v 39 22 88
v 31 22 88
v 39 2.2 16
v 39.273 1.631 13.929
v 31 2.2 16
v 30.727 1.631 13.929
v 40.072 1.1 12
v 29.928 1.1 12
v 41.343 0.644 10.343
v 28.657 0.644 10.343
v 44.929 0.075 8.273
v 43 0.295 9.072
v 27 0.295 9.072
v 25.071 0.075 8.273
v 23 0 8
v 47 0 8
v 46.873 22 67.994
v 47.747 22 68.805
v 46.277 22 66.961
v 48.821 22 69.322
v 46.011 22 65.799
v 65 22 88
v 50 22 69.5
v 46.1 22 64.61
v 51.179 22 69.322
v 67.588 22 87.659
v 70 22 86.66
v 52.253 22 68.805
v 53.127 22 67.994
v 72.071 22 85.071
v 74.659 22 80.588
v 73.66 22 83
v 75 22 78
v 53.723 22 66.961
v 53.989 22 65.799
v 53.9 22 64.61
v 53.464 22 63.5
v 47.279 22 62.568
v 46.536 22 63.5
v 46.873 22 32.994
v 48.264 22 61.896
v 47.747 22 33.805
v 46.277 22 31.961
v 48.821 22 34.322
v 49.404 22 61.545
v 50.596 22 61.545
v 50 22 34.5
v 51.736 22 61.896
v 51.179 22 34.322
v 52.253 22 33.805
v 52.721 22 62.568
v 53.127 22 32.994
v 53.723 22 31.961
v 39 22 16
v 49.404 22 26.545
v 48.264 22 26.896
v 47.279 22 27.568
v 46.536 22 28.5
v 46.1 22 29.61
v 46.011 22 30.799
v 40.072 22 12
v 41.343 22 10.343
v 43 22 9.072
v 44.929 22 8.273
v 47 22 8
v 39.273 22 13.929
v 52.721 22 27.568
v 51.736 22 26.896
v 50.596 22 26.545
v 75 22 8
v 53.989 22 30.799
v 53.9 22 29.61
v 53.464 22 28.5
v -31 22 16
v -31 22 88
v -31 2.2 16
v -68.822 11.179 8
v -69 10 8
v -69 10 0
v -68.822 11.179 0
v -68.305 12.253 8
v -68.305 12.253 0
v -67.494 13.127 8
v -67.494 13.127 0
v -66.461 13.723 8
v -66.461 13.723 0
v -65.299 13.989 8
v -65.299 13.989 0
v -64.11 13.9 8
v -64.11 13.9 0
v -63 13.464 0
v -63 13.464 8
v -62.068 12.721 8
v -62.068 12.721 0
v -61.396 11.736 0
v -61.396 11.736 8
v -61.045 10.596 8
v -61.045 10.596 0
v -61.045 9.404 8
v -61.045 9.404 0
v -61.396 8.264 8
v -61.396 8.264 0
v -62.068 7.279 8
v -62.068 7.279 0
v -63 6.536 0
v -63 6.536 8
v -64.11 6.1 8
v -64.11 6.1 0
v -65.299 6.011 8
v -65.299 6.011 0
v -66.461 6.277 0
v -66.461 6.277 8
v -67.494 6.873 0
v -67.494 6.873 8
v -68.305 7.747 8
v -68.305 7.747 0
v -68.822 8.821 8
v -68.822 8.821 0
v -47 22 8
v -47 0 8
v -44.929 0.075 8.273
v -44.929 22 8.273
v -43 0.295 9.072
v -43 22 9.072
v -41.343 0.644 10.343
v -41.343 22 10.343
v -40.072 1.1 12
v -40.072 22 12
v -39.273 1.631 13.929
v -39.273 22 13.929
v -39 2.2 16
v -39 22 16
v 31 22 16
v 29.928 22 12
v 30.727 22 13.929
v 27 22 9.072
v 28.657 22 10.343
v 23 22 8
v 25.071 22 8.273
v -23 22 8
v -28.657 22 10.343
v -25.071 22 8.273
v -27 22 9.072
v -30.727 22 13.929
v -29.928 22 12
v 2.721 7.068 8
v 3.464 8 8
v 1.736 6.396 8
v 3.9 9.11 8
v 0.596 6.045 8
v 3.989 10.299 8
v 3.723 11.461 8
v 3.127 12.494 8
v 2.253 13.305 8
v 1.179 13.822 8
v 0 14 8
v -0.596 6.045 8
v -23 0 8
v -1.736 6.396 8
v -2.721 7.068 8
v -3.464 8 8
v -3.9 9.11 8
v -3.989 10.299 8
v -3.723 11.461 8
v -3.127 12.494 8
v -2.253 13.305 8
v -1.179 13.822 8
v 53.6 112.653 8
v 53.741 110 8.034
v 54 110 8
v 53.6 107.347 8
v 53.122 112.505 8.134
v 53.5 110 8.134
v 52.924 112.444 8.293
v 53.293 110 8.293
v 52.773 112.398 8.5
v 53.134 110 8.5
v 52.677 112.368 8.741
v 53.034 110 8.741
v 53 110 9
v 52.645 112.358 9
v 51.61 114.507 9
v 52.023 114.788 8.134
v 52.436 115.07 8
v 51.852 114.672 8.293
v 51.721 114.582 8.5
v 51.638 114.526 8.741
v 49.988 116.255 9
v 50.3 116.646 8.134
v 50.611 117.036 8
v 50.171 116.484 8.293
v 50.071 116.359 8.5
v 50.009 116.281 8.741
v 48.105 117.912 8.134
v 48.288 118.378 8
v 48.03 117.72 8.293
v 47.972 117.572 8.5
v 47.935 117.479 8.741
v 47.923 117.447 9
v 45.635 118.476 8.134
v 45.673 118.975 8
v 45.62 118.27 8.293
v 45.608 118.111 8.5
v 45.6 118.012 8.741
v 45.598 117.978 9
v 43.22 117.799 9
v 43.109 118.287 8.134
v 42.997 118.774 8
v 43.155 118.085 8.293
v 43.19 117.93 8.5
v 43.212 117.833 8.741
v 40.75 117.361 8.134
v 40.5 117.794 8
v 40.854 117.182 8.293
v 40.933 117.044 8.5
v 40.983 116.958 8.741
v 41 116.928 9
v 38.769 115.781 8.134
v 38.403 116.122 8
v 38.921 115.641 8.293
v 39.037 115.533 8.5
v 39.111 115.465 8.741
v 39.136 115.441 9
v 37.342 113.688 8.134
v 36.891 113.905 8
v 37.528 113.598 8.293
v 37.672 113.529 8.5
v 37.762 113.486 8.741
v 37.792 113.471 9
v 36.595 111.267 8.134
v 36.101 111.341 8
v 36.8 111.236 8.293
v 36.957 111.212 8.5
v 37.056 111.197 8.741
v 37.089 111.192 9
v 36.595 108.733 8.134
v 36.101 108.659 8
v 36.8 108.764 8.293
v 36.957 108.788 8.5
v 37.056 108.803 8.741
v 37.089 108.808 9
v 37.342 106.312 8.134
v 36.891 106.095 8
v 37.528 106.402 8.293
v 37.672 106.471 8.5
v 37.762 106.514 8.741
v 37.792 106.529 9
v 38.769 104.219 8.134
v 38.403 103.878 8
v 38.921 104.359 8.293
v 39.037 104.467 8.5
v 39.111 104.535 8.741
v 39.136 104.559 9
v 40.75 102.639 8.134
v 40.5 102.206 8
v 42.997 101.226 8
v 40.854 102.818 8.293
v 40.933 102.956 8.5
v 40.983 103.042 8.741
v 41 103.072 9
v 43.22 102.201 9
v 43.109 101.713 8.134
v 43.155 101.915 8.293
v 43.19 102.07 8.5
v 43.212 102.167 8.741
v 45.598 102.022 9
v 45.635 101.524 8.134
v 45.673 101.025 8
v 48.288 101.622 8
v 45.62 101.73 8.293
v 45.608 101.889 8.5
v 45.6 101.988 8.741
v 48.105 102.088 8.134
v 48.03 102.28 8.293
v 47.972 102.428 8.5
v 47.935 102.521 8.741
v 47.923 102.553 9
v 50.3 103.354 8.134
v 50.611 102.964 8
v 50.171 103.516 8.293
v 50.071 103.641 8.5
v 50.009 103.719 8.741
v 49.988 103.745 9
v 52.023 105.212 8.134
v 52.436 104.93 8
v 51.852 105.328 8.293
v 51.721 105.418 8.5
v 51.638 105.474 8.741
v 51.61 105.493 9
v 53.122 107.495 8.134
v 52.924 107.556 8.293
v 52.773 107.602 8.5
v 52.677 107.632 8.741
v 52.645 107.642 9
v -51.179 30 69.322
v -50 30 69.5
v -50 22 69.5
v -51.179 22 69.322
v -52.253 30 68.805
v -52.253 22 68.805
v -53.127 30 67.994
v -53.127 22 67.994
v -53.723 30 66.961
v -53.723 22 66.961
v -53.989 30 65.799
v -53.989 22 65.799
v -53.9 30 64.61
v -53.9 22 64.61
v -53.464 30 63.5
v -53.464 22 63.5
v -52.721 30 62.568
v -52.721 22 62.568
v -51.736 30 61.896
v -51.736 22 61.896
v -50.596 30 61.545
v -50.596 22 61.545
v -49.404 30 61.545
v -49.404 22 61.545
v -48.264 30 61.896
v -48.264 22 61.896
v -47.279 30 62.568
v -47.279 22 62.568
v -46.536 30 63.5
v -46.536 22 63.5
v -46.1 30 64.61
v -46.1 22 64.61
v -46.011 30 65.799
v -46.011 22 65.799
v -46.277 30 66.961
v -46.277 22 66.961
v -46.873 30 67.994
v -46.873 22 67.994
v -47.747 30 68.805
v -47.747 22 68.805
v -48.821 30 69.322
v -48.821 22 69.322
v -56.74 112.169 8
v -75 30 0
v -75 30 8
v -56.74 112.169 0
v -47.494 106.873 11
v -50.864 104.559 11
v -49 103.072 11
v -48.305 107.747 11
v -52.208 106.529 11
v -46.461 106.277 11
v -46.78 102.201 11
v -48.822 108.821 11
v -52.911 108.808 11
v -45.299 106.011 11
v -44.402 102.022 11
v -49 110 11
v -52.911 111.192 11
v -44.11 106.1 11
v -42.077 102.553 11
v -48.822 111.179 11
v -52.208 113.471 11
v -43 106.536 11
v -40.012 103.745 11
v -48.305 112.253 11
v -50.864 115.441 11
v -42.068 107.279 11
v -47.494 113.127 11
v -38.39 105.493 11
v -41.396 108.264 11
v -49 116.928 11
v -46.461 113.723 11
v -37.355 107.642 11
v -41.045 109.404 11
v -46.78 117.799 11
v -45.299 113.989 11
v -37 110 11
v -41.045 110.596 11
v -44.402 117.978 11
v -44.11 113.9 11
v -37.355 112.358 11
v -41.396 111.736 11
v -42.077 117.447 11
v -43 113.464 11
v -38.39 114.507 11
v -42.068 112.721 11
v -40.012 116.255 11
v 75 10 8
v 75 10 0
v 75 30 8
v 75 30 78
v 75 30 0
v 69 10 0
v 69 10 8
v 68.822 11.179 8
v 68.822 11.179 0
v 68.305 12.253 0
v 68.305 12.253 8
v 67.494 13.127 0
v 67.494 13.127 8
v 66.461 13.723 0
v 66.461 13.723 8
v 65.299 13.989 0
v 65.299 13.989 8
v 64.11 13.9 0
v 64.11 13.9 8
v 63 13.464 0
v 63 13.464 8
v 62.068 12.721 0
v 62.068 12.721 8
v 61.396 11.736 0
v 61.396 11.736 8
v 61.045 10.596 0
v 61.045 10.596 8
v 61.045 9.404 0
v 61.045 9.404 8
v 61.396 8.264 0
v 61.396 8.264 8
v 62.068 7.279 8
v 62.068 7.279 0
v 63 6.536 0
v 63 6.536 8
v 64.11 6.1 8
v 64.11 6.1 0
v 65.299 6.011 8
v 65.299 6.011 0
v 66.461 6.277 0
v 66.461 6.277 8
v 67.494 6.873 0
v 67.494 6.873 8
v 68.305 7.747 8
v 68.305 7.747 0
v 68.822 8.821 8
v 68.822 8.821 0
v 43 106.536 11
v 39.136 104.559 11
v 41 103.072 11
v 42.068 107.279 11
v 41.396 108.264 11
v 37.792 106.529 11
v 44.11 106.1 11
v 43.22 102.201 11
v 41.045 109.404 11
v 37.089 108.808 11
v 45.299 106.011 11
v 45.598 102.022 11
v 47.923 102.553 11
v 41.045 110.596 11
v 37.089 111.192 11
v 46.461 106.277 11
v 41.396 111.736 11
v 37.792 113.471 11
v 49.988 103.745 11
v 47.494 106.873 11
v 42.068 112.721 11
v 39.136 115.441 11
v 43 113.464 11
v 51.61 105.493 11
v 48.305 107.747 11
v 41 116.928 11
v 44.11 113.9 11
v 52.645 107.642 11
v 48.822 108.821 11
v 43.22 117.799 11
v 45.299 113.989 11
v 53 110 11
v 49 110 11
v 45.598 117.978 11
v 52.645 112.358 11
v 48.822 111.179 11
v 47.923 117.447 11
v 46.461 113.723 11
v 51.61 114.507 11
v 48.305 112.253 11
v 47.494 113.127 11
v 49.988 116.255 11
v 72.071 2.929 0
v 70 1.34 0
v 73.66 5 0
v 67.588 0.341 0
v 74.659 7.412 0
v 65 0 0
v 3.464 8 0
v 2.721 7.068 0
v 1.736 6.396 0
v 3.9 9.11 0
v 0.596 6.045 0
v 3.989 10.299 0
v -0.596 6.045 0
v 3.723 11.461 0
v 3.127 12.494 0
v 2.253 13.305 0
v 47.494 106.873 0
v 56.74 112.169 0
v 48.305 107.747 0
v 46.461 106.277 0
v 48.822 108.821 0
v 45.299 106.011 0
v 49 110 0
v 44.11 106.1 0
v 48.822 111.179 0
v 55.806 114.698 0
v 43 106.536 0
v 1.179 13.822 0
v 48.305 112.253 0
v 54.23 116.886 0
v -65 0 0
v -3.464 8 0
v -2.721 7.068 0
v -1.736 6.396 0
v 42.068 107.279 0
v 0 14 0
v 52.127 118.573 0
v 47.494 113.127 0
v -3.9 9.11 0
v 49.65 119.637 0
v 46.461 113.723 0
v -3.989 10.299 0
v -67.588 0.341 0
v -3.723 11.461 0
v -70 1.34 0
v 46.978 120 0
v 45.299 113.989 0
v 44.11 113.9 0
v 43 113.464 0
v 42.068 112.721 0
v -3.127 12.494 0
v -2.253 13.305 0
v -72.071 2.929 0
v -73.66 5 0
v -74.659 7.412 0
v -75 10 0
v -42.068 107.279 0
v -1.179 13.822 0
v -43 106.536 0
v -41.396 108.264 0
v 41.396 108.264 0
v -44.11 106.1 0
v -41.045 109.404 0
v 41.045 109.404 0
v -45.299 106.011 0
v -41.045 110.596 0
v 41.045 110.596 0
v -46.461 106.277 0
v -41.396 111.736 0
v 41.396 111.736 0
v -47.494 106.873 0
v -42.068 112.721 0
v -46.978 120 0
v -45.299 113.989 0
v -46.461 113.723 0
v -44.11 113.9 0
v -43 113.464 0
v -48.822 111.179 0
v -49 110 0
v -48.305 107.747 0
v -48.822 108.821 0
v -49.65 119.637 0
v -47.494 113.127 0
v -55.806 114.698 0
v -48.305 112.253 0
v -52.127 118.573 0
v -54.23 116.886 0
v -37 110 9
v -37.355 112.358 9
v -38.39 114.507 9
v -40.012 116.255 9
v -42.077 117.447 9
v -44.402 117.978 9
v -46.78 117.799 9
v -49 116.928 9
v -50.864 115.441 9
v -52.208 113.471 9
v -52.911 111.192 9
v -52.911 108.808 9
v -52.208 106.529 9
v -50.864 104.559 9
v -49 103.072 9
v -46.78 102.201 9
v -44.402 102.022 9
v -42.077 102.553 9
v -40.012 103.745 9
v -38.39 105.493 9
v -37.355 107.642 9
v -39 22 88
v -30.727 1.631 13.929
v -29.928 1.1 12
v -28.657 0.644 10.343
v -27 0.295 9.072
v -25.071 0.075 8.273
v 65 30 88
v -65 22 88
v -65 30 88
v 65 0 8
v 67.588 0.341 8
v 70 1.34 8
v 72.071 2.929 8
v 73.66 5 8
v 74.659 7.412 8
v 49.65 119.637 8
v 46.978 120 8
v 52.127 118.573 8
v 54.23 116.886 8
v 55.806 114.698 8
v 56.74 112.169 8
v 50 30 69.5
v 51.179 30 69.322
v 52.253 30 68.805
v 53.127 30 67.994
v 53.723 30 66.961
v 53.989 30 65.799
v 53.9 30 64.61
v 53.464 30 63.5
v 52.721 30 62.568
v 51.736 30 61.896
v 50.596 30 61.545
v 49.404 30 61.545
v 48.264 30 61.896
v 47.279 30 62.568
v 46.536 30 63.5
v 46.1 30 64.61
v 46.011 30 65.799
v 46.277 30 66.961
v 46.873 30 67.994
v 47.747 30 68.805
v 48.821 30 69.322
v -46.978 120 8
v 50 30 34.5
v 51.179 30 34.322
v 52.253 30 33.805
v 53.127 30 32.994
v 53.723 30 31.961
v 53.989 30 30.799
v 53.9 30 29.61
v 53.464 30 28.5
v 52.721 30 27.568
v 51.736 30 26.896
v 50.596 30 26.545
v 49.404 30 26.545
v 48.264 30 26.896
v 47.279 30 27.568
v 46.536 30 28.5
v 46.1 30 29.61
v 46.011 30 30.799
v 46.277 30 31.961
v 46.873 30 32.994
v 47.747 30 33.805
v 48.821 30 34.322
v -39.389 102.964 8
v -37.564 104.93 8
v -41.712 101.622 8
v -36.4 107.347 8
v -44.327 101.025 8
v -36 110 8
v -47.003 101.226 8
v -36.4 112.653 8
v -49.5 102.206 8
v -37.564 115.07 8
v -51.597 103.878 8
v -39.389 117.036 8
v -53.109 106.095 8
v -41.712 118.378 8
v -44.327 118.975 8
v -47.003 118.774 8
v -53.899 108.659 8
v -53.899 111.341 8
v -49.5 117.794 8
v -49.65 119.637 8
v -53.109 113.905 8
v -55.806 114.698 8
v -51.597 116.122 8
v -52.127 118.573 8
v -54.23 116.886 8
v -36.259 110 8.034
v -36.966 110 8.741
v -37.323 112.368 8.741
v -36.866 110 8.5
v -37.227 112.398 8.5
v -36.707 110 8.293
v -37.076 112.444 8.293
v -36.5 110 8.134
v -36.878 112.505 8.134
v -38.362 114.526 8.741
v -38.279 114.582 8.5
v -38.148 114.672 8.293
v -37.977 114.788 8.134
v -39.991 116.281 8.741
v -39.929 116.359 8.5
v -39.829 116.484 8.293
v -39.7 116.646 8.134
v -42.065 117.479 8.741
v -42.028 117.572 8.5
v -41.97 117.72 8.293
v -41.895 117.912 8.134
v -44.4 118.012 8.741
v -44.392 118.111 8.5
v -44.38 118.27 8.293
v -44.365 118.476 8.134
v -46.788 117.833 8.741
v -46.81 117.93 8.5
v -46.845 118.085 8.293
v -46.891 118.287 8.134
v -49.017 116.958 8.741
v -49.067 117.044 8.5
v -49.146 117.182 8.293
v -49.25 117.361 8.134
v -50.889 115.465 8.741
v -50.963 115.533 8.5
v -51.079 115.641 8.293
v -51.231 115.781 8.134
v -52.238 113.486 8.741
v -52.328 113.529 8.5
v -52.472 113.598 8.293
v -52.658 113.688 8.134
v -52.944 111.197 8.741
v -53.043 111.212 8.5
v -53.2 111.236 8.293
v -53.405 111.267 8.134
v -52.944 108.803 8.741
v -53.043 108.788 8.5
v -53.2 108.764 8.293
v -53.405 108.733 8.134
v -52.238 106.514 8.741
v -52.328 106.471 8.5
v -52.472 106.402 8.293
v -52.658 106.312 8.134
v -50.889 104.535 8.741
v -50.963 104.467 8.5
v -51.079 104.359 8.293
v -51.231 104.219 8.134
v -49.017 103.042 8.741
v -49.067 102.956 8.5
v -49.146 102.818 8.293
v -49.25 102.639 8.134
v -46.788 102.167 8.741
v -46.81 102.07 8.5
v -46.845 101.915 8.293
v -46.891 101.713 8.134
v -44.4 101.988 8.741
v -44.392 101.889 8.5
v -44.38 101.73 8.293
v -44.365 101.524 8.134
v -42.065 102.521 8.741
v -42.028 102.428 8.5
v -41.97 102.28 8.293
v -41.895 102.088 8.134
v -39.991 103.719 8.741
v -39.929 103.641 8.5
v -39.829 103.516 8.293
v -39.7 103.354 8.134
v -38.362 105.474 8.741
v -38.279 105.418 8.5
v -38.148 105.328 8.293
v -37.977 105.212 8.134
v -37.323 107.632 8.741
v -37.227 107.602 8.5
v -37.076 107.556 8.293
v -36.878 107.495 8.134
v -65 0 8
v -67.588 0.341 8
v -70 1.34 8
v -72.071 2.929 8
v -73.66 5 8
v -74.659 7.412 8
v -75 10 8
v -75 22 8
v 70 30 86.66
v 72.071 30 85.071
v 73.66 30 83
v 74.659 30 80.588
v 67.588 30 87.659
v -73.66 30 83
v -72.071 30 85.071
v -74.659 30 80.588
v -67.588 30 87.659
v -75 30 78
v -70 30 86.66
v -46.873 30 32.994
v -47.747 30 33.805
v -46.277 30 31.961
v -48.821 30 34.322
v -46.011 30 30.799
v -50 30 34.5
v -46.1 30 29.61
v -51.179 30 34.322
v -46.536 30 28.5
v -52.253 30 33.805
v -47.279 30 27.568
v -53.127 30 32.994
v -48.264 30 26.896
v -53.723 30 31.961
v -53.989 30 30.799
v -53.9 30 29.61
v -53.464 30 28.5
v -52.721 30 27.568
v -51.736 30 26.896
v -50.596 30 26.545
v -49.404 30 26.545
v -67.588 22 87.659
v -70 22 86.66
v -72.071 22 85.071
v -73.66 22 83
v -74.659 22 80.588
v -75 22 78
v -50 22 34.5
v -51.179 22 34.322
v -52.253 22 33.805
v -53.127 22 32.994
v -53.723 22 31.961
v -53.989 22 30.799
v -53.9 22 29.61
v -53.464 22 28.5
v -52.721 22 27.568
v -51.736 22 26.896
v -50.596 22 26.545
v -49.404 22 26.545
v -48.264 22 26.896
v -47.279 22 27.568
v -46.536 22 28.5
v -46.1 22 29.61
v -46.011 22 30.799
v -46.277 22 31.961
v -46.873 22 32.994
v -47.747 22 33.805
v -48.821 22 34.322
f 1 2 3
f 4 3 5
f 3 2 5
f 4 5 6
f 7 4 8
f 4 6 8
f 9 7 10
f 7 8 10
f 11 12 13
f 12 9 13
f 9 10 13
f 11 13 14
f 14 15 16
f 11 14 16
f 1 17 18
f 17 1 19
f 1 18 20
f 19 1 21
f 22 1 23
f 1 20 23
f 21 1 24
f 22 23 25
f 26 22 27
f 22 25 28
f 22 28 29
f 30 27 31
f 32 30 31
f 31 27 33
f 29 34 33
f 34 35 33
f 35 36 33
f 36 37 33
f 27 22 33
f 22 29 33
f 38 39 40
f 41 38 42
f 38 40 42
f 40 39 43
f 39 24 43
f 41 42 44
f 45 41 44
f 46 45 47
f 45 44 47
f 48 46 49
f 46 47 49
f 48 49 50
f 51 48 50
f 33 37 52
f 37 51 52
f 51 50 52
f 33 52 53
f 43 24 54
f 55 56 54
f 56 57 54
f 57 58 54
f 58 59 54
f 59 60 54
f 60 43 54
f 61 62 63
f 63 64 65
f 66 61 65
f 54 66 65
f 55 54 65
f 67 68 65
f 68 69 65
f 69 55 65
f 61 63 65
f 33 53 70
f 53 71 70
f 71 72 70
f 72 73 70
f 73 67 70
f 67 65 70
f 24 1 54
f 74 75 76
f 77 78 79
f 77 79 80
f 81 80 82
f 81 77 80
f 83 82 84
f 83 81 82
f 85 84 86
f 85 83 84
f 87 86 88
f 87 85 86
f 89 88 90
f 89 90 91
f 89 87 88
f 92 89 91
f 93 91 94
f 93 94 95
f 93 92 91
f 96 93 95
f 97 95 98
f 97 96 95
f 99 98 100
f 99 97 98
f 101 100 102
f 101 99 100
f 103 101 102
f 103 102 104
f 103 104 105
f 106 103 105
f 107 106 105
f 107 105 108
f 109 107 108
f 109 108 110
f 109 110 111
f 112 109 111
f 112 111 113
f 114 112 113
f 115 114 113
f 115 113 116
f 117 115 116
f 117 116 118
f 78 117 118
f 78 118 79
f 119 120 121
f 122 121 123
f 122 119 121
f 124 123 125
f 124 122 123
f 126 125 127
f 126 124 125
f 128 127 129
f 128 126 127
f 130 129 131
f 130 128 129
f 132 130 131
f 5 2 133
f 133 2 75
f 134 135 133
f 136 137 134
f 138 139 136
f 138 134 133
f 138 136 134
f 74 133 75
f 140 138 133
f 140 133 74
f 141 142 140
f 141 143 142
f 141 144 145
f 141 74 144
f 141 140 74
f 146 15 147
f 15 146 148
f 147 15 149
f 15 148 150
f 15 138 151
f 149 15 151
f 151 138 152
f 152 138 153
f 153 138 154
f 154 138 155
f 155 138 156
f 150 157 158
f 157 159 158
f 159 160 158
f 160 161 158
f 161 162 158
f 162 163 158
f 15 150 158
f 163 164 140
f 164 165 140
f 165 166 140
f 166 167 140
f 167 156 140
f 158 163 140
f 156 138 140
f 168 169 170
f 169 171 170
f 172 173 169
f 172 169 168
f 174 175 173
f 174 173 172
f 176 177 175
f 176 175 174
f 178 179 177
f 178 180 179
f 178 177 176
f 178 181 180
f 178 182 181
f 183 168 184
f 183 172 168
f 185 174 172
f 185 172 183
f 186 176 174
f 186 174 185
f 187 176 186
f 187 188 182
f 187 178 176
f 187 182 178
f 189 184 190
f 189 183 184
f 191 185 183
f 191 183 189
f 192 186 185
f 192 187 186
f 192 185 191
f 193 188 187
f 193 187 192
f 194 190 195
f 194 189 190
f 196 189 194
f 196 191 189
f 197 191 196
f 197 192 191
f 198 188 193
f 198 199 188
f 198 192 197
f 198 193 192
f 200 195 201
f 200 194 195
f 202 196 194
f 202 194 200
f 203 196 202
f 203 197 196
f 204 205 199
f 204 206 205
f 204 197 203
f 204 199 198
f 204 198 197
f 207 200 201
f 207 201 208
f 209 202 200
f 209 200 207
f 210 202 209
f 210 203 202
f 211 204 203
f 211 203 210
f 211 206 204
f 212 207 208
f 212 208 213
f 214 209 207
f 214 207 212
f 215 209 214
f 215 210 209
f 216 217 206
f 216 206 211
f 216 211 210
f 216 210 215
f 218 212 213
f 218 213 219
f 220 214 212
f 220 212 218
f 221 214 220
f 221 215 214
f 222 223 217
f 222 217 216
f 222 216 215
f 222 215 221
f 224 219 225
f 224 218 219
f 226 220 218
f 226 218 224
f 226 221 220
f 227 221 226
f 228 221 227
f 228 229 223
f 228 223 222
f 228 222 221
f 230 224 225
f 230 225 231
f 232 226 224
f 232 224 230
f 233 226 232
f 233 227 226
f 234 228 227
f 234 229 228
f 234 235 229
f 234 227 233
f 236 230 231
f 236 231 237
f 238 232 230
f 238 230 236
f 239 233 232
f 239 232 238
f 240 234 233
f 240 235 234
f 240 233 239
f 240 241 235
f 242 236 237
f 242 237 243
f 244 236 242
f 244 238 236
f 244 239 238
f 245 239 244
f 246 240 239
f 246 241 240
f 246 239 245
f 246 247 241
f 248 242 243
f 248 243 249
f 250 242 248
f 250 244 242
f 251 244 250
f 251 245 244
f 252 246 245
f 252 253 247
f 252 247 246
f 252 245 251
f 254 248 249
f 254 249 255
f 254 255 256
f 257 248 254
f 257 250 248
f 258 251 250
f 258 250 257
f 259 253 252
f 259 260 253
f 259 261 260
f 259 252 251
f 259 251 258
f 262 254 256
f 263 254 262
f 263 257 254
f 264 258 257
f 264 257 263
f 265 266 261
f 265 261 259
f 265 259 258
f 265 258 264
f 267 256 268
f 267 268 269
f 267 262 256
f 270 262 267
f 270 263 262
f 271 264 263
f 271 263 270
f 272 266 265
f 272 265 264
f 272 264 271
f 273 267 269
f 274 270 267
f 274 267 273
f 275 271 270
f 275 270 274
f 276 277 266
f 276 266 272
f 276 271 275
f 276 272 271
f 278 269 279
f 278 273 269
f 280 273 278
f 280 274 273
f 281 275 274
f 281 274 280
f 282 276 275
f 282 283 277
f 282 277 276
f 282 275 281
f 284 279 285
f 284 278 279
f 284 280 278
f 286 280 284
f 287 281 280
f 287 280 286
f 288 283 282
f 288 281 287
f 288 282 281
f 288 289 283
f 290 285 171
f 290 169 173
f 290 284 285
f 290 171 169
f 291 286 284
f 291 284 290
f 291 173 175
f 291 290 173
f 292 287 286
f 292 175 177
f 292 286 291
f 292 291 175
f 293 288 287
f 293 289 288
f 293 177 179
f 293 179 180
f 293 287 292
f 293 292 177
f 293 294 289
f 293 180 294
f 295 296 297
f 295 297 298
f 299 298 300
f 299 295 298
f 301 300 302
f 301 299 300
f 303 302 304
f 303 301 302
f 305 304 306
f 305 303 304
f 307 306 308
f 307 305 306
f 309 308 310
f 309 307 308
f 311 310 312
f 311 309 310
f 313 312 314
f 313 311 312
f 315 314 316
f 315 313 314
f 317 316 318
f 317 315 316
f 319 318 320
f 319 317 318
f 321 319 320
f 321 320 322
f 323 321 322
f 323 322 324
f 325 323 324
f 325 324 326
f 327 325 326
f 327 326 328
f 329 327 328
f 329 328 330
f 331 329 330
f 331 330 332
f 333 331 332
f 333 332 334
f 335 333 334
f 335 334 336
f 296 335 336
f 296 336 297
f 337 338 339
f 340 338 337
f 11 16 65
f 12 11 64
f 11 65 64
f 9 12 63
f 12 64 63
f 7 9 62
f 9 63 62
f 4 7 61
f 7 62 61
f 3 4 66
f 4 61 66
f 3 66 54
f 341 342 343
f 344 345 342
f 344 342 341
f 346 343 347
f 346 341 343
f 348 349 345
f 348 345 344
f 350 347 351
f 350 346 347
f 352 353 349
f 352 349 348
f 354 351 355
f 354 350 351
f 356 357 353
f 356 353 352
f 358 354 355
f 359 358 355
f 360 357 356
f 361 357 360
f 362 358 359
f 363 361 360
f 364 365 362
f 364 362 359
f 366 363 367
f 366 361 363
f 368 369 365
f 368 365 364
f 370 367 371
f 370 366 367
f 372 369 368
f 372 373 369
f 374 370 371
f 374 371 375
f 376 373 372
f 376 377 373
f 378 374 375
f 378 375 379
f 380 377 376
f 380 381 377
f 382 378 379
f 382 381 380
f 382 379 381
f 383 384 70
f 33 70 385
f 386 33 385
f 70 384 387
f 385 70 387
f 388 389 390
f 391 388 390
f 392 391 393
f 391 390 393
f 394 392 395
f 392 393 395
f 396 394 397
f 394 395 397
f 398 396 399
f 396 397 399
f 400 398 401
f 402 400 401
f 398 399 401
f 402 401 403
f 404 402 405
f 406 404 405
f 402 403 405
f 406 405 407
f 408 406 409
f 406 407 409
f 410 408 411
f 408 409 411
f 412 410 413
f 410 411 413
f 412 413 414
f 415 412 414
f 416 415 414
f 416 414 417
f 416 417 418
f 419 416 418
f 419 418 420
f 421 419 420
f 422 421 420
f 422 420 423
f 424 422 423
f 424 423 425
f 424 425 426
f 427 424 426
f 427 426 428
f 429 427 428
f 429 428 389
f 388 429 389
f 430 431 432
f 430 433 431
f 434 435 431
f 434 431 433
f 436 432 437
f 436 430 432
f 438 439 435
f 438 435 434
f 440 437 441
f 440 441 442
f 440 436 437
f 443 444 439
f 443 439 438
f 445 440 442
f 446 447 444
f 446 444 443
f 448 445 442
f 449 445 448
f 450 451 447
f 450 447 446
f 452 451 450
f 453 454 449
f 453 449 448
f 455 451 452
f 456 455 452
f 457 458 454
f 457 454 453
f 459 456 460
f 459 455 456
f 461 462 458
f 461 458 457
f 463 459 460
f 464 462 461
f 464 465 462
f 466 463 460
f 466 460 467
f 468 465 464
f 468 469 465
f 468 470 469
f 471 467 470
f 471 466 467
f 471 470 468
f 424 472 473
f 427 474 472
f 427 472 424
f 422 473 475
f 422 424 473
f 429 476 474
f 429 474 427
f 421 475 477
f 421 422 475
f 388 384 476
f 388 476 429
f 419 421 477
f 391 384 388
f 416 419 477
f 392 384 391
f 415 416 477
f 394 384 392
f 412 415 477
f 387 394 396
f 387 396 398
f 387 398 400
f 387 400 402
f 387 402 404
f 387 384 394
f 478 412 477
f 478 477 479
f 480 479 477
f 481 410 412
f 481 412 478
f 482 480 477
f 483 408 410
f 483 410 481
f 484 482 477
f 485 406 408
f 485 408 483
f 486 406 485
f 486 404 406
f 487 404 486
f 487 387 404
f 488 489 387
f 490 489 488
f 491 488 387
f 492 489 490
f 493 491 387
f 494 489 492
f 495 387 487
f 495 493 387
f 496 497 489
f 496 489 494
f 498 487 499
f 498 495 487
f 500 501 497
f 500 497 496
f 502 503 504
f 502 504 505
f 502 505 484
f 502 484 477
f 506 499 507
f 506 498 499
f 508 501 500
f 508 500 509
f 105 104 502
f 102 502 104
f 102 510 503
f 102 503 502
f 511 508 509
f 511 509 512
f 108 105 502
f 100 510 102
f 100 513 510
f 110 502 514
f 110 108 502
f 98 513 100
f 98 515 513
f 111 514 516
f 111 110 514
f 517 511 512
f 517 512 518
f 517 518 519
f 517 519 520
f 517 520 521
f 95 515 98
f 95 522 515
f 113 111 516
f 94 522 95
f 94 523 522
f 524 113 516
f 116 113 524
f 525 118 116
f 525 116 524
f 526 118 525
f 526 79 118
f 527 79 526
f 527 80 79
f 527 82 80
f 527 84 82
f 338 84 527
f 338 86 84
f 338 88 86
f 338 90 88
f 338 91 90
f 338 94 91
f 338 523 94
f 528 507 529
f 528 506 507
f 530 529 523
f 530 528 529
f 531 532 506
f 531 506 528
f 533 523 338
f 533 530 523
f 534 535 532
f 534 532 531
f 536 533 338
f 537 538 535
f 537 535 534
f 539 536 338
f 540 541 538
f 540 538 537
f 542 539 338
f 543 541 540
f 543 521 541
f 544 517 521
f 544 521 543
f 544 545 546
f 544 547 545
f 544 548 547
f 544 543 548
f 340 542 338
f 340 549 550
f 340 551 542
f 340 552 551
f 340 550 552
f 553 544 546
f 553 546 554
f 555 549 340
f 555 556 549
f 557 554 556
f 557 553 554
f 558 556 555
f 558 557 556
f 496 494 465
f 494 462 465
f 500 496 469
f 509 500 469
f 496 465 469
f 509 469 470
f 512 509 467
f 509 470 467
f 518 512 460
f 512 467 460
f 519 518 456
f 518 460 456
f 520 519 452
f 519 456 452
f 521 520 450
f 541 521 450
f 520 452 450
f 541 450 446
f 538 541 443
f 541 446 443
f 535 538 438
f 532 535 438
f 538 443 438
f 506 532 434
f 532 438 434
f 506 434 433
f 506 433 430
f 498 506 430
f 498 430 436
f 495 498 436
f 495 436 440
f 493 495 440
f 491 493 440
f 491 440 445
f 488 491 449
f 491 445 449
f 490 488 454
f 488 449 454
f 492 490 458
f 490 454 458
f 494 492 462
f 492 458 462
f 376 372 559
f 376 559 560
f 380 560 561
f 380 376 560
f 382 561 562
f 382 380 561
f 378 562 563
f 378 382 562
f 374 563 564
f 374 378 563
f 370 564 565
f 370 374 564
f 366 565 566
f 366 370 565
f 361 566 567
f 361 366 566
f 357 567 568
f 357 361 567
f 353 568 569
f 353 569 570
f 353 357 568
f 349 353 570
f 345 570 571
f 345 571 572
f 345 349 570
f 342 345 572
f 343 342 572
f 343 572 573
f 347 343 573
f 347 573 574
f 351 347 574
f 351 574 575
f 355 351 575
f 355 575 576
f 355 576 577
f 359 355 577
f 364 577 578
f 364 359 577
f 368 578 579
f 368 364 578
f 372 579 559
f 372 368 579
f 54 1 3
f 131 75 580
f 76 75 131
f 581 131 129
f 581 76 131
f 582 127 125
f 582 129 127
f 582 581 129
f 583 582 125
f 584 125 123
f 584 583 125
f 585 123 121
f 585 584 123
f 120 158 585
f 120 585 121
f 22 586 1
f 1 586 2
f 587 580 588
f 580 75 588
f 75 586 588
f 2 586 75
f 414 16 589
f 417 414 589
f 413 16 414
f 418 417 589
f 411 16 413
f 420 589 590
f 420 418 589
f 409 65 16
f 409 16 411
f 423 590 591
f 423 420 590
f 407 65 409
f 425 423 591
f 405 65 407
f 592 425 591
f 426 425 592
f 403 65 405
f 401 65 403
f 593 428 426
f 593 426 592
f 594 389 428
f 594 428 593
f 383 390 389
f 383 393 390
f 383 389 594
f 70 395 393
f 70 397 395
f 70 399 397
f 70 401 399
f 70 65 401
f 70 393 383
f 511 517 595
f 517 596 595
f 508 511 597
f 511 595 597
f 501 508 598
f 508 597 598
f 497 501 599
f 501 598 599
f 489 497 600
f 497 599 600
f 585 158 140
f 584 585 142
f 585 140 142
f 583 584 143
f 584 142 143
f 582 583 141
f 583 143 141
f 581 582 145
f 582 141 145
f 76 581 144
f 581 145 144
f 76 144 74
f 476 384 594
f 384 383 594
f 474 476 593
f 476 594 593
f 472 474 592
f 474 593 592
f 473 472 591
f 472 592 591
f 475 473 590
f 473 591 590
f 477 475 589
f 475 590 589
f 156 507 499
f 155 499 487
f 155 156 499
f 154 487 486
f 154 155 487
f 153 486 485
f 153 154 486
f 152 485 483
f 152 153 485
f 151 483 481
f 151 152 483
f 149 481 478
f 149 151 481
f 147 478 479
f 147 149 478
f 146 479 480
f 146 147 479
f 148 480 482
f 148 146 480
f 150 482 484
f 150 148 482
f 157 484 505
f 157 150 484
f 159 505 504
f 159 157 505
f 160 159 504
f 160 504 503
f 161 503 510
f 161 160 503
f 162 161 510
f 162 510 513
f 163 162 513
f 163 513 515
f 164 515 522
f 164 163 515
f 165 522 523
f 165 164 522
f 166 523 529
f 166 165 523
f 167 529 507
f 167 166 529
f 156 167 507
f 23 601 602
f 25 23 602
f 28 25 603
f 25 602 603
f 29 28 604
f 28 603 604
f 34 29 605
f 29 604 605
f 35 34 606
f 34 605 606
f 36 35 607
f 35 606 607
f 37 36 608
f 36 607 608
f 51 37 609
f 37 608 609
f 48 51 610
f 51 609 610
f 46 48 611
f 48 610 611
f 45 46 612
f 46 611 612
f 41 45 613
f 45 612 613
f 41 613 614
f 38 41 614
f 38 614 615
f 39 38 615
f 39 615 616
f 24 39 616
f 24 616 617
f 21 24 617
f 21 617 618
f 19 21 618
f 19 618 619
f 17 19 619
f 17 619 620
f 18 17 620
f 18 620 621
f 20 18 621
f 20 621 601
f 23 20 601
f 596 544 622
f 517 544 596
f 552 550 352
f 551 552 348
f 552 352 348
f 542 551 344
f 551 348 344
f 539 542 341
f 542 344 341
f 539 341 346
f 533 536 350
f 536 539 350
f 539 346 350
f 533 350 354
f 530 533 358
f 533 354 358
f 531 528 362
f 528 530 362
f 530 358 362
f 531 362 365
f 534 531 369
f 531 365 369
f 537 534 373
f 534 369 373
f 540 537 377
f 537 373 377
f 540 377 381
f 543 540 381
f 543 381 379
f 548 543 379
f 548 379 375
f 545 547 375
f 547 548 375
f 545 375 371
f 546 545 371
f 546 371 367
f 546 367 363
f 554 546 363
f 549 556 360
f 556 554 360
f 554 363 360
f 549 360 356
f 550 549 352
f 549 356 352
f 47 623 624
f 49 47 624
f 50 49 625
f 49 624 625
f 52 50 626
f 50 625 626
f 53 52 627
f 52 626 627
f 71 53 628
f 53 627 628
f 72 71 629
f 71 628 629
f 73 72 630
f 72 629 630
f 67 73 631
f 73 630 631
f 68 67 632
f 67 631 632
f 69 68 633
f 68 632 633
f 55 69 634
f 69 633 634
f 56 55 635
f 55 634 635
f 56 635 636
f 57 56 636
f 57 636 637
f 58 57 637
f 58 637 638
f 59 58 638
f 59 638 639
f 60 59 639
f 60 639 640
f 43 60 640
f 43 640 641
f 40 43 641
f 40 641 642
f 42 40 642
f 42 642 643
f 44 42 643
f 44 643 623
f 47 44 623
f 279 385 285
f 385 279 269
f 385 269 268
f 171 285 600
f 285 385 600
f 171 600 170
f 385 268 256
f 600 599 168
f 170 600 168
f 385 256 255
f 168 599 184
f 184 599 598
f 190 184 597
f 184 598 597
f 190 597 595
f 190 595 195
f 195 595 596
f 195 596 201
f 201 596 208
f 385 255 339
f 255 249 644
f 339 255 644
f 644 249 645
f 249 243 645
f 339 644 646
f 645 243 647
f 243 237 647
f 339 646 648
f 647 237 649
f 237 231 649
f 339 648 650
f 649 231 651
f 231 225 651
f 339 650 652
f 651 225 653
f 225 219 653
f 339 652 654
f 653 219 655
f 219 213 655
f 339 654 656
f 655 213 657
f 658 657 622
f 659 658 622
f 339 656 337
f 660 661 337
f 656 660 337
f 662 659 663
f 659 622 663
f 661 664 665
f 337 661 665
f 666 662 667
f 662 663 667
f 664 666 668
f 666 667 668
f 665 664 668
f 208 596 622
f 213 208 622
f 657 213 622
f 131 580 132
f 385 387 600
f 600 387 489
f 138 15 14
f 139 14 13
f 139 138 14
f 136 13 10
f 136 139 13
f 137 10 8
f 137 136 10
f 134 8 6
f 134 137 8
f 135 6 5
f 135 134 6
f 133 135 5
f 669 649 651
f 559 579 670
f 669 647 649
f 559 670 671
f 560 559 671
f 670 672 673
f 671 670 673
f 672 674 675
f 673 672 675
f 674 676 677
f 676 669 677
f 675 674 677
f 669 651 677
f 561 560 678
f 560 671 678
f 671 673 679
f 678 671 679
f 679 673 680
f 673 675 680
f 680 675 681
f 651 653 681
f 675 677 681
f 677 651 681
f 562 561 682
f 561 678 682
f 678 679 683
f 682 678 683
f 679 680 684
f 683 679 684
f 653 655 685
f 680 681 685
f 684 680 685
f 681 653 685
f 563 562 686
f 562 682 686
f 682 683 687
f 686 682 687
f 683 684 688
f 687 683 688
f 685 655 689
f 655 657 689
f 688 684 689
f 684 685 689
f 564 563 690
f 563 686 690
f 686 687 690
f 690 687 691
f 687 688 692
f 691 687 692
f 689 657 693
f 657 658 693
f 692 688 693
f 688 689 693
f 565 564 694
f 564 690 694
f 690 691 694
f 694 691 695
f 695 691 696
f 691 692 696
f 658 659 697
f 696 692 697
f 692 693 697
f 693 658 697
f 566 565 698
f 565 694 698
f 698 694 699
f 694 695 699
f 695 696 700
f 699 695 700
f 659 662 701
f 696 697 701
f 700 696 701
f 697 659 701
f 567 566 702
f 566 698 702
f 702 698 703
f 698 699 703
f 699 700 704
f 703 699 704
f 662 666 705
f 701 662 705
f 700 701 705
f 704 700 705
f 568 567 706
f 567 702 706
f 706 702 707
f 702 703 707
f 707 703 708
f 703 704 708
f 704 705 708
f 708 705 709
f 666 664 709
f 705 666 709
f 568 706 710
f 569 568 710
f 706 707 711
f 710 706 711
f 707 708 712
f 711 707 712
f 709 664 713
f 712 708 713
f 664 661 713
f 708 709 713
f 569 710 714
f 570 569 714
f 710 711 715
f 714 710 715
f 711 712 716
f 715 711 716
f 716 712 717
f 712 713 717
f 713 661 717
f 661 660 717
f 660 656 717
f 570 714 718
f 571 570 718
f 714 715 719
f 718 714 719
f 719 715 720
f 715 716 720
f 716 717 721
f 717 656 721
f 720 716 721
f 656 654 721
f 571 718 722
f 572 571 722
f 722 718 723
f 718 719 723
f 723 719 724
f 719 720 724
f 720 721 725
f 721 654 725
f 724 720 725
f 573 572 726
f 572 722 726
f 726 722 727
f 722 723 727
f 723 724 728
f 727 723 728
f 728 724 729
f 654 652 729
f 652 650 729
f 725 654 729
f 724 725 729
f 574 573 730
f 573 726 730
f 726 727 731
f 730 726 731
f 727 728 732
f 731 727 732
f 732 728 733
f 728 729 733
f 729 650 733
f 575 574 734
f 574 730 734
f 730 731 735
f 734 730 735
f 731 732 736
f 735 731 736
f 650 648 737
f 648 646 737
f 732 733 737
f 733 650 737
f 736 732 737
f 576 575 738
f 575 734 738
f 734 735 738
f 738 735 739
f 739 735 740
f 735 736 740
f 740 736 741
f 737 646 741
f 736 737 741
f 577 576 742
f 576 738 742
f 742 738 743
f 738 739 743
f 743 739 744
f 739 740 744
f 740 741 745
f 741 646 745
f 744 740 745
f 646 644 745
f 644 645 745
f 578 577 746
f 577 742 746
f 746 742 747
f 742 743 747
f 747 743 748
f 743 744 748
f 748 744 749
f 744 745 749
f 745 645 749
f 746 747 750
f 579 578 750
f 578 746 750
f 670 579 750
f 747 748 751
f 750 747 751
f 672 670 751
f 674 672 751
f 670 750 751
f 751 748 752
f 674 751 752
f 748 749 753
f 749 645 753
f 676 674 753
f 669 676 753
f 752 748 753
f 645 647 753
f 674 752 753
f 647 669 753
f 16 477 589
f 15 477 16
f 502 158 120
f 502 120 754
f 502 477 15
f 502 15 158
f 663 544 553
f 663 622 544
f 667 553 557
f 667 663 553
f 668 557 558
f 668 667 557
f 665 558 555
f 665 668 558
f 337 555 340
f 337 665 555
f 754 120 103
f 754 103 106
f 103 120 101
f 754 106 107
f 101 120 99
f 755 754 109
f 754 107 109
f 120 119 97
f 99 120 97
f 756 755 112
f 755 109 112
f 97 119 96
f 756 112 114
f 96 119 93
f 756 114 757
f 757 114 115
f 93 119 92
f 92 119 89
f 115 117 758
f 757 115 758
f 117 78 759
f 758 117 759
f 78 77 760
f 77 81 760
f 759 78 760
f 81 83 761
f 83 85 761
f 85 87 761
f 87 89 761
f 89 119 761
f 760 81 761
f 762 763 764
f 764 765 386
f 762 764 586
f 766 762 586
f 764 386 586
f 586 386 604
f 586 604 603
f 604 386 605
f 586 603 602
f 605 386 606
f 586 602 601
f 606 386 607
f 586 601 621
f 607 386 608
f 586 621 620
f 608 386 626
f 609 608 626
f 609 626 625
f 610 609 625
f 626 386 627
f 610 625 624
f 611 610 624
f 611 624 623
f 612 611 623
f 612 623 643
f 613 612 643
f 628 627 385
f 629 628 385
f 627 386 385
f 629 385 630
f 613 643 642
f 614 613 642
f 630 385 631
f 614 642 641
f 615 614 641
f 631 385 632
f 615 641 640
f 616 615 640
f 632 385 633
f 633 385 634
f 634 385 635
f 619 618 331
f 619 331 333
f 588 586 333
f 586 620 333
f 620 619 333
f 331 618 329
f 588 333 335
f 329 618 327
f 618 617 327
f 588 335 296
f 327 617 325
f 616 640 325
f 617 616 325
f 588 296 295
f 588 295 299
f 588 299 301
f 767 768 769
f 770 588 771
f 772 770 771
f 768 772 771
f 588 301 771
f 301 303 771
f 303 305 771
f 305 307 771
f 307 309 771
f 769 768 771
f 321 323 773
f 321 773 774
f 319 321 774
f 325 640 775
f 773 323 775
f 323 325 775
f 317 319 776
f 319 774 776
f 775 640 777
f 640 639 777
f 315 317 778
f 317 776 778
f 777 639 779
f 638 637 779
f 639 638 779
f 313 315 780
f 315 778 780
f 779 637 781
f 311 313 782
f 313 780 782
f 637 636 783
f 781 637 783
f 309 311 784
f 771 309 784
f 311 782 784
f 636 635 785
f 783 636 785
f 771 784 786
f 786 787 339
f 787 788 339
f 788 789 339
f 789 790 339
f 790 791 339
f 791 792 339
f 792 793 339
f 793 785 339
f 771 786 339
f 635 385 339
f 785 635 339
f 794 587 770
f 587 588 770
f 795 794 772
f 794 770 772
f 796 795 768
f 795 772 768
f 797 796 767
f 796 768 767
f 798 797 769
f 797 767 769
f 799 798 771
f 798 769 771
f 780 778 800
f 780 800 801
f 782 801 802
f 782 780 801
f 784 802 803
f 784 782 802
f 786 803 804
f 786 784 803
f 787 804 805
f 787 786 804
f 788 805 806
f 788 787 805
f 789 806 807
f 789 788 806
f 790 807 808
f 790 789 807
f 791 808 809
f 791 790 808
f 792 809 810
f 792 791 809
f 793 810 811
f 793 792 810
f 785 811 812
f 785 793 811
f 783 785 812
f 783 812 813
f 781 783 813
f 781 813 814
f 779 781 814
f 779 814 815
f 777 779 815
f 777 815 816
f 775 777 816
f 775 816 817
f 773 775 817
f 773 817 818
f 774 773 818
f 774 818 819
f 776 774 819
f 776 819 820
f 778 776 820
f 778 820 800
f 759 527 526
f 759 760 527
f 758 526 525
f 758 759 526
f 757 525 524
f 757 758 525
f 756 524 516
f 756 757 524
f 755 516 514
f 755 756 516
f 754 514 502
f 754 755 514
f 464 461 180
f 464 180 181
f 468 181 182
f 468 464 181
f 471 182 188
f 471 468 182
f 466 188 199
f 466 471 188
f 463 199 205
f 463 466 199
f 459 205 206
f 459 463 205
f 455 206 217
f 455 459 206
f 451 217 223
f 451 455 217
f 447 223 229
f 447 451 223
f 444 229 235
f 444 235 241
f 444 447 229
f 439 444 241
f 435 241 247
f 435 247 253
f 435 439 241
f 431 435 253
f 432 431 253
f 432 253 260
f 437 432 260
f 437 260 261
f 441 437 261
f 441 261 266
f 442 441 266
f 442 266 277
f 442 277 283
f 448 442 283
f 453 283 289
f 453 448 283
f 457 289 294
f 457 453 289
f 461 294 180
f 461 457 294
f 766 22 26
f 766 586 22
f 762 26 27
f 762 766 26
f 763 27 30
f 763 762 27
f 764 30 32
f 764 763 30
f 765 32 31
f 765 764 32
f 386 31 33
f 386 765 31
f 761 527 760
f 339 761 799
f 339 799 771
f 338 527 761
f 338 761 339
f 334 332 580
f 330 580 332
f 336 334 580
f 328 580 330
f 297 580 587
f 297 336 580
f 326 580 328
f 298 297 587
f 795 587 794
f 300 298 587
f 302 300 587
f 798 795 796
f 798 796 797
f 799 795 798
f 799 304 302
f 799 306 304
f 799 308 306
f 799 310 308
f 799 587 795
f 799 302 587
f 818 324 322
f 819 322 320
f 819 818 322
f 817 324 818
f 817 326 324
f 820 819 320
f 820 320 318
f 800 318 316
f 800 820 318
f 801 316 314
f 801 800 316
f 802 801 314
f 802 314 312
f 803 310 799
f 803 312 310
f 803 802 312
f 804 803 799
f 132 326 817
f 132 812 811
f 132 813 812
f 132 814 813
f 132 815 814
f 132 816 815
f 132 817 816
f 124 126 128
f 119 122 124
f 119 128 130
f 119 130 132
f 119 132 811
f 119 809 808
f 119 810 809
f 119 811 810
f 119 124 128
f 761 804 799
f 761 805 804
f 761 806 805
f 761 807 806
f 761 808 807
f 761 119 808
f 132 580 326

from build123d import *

# Parameters (mm, degrees)
EXTRUDE_1_DEPTH     = 8
SKETCH_2_R          = 4
CUT_EXTRUDE_1_DEPTH = 142.73566947
SKETCH_3_W          = 75
SKETCH_3_H          = 8
EXTRUDE_2_DEPTH     = 80
SKETCH_5_R          = 4
CUT_EXTRUDE_2_DEPTH = 147.523035732
RIB_1_REACH         = 156.091
SKETCH_6_WALL_W     = 393.151638598
SKETCH_6_WALL_H     = 8
FILLET_2_R          = 10
EXTRUDE_START       = 3
SKETCH_7_R          = 8
SKETCH_7_R_2        = 4
EXTRUDE_3_DEPTH     = 3
FILLET_3_R          = 1
FILLET_4_R          = 8


with BuildPart() as part:
    # Эскиз1 → Бобышка-Вытянуть1 (new body)
    with BuildSketch(Plane.XY):
        Polygon((0, 0), (75, 0), (75, 30), (55, 120), (0, 120), align=None)
    extrude(amount=EXTRUDE_1_DEPTH)

    # Эскиз2 → Вырез-Вытянуть1 (cut, through all)
    with BuildSketch(Plane.XY.offset(8)):
        with Locations((45, 110)):
            Circle(SKETCH_2_R)
        with Locations((0, 10)):
            Circle(SKETCH_2_R)
        with Locations((65, 10)):
            Circle(SKETCH_2_R)
    extrude(amount=-CUT_EXTRUDE_1_DEPTH, mode=Mode.SUBTRACT)

    # Эскиз3 → Бобышка-Вытянуть2 (add)
    with BuildSketch(Plane.XY.offset(8)):
        with Locations((37.5, 26)):
            Rectangle(SKETCH_3_W, SKETCH_3_H)
    extrude(amount=EXTRUDE_2_DEPTH)

    # Эскиз5 → Вырез-Вытянуть2 (cut, through all)
    with BuildSketch(Plane(origin=(0, 30, 0), x_dir=(1, 0, 0), z_dir=(0, 1, 0))):
        with Locations(Location((50, -30.5, 0), (0, 0, 270))):
            Circle(SKETCH_5_R)
        with Locations(Location((50, -65.5, 0), (0, 0, 270))):
            Circle(SKETCH_5_R)
    extrude(amount=-CUT_EXTRUDE_2_DEPTH, mode=Mode.SUBTRACT)

    # Эскиз6 wall → Ребро1 (add, up to next)
    with BuildSketch(Plane(origin=(35, 11, 48), x_dir=(0, -0.265156483021, -0.964205392804), z_dir=(0, 0.964205392804, -0.265156483021)), mode=Mode.PRIVATE) as rib_1_sk1:
        Rectangle(SKETCH_6_WALL_W, SKETCH_6_WALL_H)
    rib_1_tool1 = extrude(rib_1_sk1.sketch, amount=RIB_1_REACH, mode=Mode.PRIVATE) - part.part
    add(rib_1_tool1.solids().sort_by_distance((35, 11, 48))[0])

    # Скругление2
    fillet_2_edges = [part.edges().sort_by_distance(p)[0] for p in [
        (55, 120, 4),
        (75, 0, 4),
        (75, 26, 88),
    ]]
    fillet(fillet_2_edges, radius=FILLET_2_R)

    # Зеркальное отражение1: part across plane


with BuildPart() as part_1:
    add(part.part)
    add(part.part.mirror(Plane(origin=(0, 120, 8), x_dir=(0, 0, 1), z_dir=(1, 0, 0))))

    # Эскиз7 → Бобышка-Вытянуть3 (add)
    # profile 1 of 2: a face of its own
    with BuildSketch(Plane.XY.offset(8).offset(EXTRUDE_START)):
        with Locations((-45, 110)):
            Circle(SKETCH_7_R)
        with Locations(Location((-45, 110, 0), (0, 0, 180))):
            Circle(SKETCH_7_R_2, mode=Mode.SUBTRACT)
    # profile 2 of 2: a face of its own
    with BuildSketch(Plane.XY.offset(8).offset(EXTRUDE_START)):
        with Locations((45, 110)):
            Circle(SKETCH_7_R)
        with Locations((45, 110)):
            Circle(SKETCH_7_R_2, mode=Mode.SUBTRACT)
    extrude(amount=-EXTRUDE_3_DEPTH)

    # Скругление3
    fillet_3_edges = [part_1.edges().sort_by_distance(p)[0] for p in [
        (-53, 110, 8),
        (37, 110, 8),
    ]]
    fillet(fillet_3_edges, radius=FILLET_3_R)

    # Скругление4
    fillet_4_edges = [part_1.edges().sort_by_distance(p)[0] for p in [
        (-39, 11, 8),
        (-31, 11, 8),
        (31, 11, 8),
        (39, 11, 8),
    ]]
    fillet(fillet_4_edges, radius=FILLET_4_R)


solid = part_1.part
